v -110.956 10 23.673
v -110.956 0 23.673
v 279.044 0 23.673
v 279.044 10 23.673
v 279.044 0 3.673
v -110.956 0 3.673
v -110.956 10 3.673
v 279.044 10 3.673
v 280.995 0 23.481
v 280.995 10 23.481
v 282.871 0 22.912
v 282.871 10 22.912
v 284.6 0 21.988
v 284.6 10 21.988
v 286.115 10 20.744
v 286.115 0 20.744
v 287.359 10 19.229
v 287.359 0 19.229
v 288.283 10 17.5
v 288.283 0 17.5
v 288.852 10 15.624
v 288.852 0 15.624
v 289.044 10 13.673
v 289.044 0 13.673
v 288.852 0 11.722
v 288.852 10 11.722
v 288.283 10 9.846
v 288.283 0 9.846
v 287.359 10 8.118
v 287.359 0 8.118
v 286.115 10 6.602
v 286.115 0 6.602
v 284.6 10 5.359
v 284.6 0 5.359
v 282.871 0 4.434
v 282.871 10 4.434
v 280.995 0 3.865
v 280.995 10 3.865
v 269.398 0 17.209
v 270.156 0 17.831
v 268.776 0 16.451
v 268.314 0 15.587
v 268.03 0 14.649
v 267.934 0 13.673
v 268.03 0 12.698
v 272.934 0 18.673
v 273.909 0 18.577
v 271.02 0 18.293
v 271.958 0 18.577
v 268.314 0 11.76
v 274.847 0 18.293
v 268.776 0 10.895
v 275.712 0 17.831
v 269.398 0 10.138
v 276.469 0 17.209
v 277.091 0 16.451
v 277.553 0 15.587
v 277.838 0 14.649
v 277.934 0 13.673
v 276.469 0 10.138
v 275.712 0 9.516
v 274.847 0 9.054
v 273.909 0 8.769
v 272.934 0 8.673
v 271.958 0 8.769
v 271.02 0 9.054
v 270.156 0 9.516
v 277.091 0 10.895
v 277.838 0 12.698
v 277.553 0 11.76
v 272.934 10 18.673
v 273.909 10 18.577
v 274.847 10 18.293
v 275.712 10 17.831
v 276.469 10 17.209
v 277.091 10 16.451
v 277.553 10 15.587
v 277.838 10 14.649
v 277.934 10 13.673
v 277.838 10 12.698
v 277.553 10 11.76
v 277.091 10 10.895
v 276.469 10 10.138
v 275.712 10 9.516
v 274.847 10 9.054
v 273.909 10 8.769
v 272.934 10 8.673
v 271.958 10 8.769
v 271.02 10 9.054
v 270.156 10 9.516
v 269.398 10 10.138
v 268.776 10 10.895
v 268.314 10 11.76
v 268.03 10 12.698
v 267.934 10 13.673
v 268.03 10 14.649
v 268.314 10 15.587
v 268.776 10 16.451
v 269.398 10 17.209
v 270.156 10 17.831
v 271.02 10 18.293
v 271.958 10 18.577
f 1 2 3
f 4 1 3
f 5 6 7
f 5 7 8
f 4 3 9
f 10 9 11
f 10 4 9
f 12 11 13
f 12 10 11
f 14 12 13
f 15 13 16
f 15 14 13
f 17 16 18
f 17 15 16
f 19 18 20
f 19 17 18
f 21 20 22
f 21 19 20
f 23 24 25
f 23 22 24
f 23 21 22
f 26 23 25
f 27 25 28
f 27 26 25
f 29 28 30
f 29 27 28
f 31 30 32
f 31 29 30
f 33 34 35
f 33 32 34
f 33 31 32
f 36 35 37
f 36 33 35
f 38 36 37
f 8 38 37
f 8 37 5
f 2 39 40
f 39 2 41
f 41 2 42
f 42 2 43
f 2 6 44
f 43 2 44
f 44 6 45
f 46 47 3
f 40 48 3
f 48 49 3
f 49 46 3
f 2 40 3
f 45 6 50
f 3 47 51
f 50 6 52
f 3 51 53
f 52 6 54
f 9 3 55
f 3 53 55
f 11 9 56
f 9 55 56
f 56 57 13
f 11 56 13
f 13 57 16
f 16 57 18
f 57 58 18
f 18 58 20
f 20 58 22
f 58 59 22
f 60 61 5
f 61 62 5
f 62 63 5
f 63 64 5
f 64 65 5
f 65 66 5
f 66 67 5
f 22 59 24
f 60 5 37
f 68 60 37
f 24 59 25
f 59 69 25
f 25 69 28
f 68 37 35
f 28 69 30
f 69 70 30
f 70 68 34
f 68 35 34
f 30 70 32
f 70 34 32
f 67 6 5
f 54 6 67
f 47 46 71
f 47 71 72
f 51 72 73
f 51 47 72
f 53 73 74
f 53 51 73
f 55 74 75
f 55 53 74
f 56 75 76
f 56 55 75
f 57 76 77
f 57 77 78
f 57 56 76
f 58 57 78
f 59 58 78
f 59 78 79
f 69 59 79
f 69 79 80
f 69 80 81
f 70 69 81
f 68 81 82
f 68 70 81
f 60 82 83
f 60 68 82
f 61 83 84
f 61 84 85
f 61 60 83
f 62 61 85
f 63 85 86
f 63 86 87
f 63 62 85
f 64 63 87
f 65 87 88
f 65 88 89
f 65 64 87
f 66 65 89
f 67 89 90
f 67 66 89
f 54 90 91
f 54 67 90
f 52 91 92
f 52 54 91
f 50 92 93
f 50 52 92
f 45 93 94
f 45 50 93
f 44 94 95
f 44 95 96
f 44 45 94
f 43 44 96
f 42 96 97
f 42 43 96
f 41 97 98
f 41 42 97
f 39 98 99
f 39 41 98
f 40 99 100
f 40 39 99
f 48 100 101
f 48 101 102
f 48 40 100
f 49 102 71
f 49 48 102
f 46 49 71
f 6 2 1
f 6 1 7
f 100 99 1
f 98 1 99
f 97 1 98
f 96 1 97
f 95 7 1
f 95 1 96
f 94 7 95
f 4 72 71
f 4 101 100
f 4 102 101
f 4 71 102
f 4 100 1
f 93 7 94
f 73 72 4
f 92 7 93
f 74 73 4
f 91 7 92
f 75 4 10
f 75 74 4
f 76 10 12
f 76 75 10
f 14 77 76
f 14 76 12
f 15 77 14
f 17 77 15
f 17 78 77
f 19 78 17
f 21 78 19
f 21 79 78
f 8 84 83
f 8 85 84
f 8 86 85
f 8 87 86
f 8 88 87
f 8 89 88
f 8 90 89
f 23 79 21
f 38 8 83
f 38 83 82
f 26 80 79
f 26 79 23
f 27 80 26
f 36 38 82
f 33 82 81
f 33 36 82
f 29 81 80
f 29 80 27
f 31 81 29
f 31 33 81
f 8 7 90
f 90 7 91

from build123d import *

# Parameters (mm, degrees)
SKETCH2_W           = 400
SKETCH2_H           = 20
SKETCH2_R           = 5
BOSS_EXTRUDE1_DEPTH = 10
FILLET1_RADIUS      = 10
FILLET1_LENGTH      = 10


with BuildPart() as part:
    # Sketch2 → Boss-Extrude1 (new body)
    with BuildSketch(Plane(origin=(0, 0, 0), x_dir=(1, 0, 0), z_dir=(0, 1, 0))):
        with Locations((89.044360902, -13.673273177)):
            Rectangle(SKETCH2_W, SKETCH2_H)
        with Locations(Location((272.933671002, -13.673273177, 0), (0, 0, 270))):
            Circle(SKETCH2_R, mode=Mode.SUBTRACT)
    extrude(amount=BOSS_EXTRUDE1_DEPTH)

    # Fillet1: full round fillet: the end face becomes a half cylinder, R = half its width
    fillet1_face = Plane((289.044360902, 5, 13.673273177), x_dir=(0, 1, 0), z_dir=(1, 0, 0))  # on the end face: x along it, z out of the body
    fillet1_slab = fillet1_face.offset(-FILLET1_RADIUS / 2) * Box(FILLET1_LENGTH, 2 * FILLET1_RADIUS, FILLET1_RADIUS, mode=Mode.PRIVATE)  # the body's end, R deep
    fillet1_round = Plane((279.044360902, 5, 13.673273177), x_dir=(1, 0, 0), z_dir=(0, 1, 0)) * Cylinder(FILLET1_RADIUS, FILLET1_LENGTH, mode=Mode.PRIVATE)  # its axis R under the face
    add(fillet1_slab - fillet1_round, mode=Mode.SUBTRACT)


solid = part.part
